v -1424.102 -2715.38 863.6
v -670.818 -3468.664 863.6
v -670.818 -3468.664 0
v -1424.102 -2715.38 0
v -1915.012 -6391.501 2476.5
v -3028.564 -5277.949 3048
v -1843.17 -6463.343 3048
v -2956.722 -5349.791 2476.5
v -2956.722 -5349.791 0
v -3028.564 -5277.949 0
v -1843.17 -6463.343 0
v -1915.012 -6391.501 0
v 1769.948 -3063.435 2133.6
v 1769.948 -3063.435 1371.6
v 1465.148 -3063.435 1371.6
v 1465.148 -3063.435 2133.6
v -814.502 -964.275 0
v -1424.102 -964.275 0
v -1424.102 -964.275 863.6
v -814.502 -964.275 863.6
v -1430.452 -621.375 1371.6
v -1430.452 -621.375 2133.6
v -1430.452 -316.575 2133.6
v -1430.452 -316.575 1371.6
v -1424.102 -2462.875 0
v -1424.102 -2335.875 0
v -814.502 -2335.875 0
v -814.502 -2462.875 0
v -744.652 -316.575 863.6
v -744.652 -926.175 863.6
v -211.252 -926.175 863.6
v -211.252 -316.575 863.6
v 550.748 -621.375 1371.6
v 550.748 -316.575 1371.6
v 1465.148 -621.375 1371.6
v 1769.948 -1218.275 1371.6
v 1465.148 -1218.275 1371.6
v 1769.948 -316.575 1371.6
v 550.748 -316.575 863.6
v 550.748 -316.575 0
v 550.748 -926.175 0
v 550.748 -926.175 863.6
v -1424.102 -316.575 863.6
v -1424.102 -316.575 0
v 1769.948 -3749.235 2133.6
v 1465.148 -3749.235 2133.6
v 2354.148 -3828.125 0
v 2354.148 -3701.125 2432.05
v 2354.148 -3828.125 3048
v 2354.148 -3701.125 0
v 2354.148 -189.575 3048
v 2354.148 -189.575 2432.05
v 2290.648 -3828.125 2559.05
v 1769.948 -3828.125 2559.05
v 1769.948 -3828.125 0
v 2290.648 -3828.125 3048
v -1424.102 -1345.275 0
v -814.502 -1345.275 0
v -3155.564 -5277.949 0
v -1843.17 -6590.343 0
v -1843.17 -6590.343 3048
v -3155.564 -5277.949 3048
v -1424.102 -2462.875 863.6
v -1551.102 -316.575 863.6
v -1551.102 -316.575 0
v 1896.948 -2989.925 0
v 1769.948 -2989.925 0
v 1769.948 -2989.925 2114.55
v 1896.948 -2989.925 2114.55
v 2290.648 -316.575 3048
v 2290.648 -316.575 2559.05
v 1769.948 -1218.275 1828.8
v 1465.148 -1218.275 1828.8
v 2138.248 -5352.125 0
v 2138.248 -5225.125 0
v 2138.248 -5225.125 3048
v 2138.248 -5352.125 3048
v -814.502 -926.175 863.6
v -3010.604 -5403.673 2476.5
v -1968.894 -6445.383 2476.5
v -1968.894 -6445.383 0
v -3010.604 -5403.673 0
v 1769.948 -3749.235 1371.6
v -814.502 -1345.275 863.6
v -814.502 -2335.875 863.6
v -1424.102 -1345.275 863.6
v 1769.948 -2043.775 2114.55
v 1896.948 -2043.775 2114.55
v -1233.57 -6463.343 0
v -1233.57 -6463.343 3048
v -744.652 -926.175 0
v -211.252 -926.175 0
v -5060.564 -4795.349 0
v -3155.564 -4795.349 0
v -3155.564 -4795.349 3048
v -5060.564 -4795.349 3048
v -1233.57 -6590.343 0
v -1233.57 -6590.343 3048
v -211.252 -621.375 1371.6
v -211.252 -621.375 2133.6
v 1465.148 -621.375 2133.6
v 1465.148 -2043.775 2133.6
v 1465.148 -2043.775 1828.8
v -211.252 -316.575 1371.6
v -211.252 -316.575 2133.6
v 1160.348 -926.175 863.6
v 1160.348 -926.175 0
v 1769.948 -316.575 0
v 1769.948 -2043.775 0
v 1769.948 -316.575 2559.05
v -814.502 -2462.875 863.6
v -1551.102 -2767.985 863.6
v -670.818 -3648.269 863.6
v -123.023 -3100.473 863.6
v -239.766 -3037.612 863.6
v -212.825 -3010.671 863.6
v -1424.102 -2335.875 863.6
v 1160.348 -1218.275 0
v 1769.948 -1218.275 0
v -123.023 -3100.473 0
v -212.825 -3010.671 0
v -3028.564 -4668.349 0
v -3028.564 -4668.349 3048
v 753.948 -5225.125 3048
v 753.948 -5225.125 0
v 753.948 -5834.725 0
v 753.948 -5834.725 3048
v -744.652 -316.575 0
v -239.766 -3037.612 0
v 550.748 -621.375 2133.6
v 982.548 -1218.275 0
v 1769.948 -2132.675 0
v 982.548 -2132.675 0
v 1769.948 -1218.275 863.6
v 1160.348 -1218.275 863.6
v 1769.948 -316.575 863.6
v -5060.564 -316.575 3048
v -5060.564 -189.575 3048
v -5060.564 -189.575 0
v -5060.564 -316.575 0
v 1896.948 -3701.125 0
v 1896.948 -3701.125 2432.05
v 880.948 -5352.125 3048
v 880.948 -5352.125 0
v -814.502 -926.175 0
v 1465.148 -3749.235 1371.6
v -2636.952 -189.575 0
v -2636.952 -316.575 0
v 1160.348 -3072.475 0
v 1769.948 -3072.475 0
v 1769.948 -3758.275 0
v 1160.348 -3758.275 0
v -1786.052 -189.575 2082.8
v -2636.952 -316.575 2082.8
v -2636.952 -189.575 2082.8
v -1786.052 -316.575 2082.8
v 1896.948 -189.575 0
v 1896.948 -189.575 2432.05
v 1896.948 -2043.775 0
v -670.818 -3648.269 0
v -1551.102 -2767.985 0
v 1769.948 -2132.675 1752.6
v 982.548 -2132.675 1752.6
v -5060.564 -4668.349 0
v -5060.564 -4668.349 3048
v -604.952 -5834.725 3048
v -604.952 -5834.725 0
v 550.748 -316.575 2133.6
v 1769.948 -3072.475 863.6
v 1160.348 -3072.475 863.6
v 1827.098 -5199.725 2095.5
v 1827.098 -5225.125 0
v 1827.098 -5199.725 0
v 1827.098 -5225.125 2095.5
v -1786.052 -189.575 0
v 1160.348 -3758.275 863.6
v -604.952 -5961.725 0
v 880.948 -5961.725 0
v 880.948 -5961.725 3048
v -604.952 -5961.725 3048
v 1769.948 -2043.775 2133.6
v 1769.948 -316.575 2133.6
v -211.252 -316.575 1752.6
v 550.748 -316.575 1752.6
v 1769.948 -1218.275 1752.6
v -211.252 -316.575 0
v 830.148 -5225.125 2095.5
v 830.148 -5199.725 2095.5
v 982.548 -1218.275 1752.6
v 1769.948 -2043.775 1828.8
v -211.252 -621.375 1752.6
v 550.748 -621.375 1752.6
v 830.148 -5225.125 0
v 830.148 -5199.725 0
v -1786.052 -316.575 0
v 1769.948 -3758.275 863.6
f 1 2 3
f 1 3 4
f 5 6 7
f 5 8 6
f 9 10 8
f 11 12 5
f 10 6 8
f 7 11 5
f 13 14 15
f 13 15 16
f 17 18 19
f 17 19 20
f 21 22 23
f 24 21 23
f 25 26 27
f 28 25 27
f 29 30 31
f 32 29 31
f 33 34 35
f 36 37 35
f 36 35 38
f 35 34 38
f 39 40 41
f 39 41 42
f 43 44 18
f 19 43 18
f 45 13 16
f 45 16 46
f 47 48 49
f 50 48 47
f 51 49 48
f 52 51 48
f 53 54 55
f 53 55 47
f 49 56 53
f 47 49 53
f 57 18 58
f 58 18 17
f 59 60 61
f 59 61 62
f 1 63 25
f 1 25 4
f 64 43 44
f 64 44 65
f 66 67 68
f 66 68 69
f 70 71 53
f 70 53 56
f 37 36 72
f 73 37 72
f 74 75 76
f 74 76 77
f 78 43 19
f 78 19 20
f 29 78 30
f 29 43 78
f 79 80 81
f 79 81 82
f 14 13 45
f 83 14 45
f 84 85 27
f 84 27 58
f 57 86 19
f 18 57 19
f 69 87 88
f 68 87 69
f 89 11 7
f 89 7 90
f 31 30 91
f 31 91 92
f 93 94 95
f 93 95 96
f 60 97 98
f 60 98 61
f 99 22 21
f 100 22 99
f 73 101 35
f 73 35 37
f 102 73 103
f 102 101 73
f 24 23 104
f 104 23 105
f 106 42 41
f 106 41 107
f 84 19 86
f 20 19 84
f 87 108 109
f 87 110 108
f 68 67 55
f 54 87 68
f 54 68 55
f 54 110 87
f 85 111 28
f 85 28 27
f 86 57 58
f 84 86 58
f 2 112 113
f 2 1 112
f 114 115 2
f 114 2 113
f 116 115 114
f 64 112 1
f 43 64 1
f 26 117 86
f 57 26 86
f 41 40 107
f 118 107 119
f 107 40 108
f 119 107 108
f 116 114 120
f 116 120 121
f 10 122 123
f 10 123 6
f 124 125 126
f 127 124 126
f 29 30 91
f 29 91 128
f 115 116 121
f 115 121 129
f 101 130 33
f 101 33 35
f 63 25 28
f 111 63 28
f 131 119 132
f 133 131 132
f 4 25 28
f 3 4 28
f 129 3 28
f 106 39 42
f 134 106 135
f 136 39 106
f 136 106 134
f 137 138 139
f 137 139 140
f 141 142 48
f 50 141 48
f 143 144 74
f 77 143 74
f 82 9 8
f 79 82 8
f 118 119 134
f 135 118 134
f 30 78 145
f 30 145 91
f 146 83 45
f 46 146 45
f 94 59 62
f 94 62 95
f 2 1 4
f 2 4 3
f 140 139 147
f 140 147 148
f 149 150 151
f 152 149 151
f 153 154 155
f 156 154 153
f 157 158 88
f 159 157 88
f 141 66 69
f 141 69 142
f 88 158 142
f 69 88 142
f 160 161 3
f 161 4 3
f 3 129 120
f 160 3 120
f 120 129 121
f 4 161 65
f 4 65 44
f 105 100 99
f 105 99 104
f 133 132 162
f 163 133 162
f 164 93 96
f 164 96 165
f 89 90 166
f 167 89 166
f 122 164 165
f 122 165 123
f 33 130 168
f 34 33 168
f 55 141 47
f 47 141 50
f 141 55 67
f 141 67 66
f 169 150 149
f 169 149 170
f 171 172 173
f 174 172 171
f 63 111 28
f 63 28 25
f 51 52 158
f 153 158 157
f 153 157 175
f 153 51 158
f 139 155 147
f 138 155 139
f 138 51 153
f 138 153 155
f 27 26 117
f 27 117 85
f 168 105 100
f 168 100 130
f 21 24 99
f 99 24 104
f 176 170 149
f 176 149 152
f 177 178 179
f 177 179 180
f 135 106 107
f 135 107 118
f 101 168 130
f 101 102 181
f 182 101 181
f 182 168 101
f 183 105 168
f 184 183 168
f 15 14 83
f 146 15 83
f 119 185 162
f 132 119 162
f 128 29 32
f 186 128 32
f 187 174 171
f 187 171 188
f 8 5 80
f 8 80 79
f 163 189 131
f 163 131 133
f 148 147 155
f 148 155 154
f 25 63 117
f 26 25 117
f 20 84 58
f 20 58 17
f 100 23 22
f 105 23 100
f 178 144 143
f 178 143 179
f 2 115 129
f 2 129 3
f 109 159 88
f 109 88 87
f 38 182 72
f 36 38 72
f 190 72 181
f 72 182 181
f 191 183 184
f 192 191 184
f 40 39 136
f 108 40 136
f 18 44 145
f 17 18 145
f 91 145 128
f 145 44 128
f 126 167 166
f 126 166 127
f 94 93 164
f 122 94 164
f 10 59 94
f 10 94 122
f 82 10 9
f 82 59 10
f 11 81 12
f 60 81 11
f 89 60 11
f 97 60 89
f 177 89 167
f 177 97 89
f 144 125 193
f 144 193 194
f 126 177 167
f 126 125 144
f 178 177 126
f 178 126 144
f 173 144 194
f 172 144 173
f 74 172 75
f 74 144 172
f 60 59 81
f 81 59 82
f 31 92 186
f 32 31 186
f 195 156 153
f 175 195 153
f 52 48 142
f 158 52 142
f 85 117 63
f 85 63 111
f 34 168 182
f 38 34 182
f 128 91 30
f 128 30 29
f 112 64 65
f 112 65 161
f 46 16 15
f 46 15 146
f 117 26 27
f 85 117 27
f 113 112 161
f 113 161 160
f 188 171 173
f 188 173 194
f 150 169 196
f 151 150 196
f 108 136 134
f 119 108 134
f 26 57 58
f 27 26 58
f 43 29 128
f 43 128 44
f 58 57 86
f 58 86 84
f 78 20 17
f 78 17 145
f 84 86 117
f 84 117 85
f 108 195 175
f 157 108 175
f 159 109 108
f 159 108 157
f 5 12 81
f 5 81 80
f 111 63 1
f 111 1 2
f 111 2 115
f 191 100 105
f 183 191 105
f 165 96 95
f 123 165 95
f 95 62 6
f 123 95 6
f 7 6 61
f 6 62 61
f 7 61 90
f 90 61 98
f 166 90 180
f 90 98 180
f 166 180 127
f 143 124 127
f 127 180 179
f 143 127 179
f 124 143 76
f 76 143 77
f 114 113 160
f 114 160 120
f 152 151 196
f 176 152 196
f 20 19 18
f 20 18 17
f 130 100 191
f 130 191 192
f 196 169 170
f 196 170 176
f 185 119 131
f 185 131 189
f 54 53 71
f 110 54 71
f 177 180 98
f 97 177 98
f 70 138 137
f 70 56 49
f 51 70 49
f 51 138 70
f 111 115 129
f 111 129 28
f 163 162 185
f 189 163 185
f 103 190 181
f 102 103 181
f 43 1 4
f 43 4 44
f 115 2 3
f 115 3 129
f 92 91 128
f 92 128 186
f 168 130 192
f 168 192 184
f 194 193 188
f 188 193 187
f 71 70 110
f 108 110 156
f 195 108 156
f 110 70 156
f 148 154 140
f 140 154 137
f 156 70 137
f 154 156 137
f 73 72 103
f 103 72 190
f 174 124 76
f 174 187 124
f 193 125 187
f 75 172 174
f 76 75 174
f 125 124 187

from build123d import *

# Parameters (mm, degrees)
F0_W      = 3556
F0_H      = 127
F1_DEPTH  = 3048
F3_DEPTH  = 3048
F4_W      = 127
F4_H      = 838.2
F5_DEPTH  = 3048
F6_W      = 1016
F6_H      = 127
F7_DEPTH  = 3048
F8_W      = 127
F8_H      = 482.6
F9_DEPTH  = 3048
F10_W     = 368.3
F10_H     = 127
F11_DEPTH = 3048
F12_W     = 996.95
F12_H     = 2095.5
F13_DEPTH = 25.4
F14_W     = 850.9
F14_H     = 965.2
F15_DEPTH = 127
F16_W     = 127
F16_H     = 965.2
F16_H_2   = 2082.8
F17_DEPTH = 2423.611736456
F18_W     = 1059.5979121052
F18_H     = 933.45
F19_DEPTH = 127
F21_W     = 457.2
F21_H     = 127
F22_DEPTH = 3048
F24_W     = 520.7
F24_H     = 3638.55
F25_DEPTH = 127
F26_W     = 3699.2286321938
F26_H     = 1626.0209083557
F27_DEPTH = 1270
F29_DEPTH = 127
F30_W     = 63.5
F30_H     = 615.95
F31_DEPTH = 3511.55
F32_W     = 685.8
F32_H     = 863.6
F33_DEPTH = 609.6
F34_W     = 685.8
F34_H     = 762
F35_DEPTH = 304.8
F36_W     = 901.7
F36_H     = 863.6
F37_DEPTH = 609.6
F38_W     = 825.5
F38_H     = 1752.6
F38_W_2   = 88.9
F39_DEPTH = 787.4
F40_W     = 609.6
F40_H     = 863.6
F41_DEPTH = 609.6
F45_DEPTH = 304.8
F46_W     = 1473.2
F46_H     = 2476.5
F47_DEPTH = 76.2
F48_W     = 914.4
F48_H     = 304.8
F49_DEPTH = 762
F50_W     = 762
F50_H     = 304.8
F51_DEPTH = 381
F52_W     = 1219.2
F52_H     = 304.8
F53_DEPTH = 762
F54_W     = 533.4
F54_H     = 609.6
F55_DEPTH = 863.6
F57_DEPTH = 863.6
F58_W     = 609.6
F58_H     = 381
F59_DEPTH = 863.6
F60_W     = 609.6
F60_H     = 990.6
F61_DEPTH = 863.6
F62_W     = 609.6
F62_H     = 127
F63_DEPTH = 863.6
F65_DEPTH = 863.6
F67_DEPTH = 863.6


with BuildPart() as f1:
    # F0 (on Top) → F1 (new body)
    with BuildSketch(Plane.XY):
        with Locations((-8.052283898, -253.0751817405)):
            Rectangle(F0_W, F0_H)
    extrude(amount=F1_DEPTH)

    # F2 (on face) → F3 (join, through all)
    with BuildSketch(Plane(origin=(0, 0, 0), x_dir=(1, 0, 0), z_dir=(0, 0, -1))):
        Polygon((1769.947716102, 2043.7751817405), (1769.947716102, 316.5751817405), (1769.947716102, 189.5751817405), (1896.947716102, 189.5751817405), (1896.947716102, 2043.7751817405), align=None)
    extrude(amount=-F3_DEPTH)

    # F14 (on face) → F15 (join, through all)
    with BuildSketch(Plane.XZ.offset(316.5751817405)):
        with Locations((-2211.502283898, 2565.4)):
            Rectangle(F14_W, F14_H)
    extrude(amount=-F15_DEPTH)

    # F16 (on face) → F17 (join, through all)
    with BuildSketch(Plane(origin=(-2636.952283898, 0, 0), x_dir=(0, -1, 0), z_dir=(-1, 0, 0))):
        with Locations((253.0751817405, 2565.4)):
            Rectangle(F16_W, F16_H)
        with Locations((253.0751817405, 1041.4)):
            Rectangle(F16_W, F16_H_2)
    extrude(amount=F17_DEPTH)



with BuildPart() as f5:
    # F4 (on face) → F5 (new body, through all)
    with BuildSketch(Plane(origin=(0, 0, 0), x_dir=(1, 0, 0), z_dir=(0, 0, -1))):
        with Locations((1833.447716102, 3409.0251817405)):
            Rectangle(F4_W, F4_H)
    extrude(amount=-F5_DEPTH)


with BuildPart() as f7:
    # F6 (on face) → F7 (new body, through all)
    with BuildSketch(Plane(origin=(0, 0, 0), x_dir=(1, 0, 0), z_dir=(0, 0, -1))):
        with Locations((1261.947716102, 5288.6251817405)):
            Rectangle(F6_W, F6_H)
    extrude(amount=-F7_DEPTH)

    # F8 (on face) → F9 (join, through all)
    with BuildSketch(Plane(origin=(0, 0, 0), x_dir=(1, 0, 0), z_dir=(0, 0, -1))):
        Polygon((-3028.564020354, 5277.9493022342), (-1843.1702123728, 6463.3431102153), (-1843.1702123728, 6590.3431102153), (-3155.564020354, 5277.9493022342), (-3155.564020354, 4795.3493022342), (-5060.564020354, 4795.3493022342), (-5060.564020354, 4668.3493022342), (-3028.564020354, 4668.3493022342), align=None)
        Polygon((-1233.5702123728, 6463.3431102153), (-604.952283898, 5834.7251817405), (-604.952283898, 5961.7251817405), (-1233.5702123728, 6590.3431102153), (-1843.1702123728, 6590.3431102153), (-1843.1702123728, 6463.3431102153), align=None)
        Polygon((-604.952283898, 5834.7251817405), (753.947716102, 5834.7251817405), (880.947716102, 5834.7251817405), (880.947716102, 5961.7251817405), (-604.952283898, 5961.7251817405), align=None)
        with Locations((817.447716102, 5593.4251817405)):
            Rectangle(F8_W, F8_H)
    extrude(amount=-F9_DEPTH)

    # F10 (on face) → F11 (join, through all)
    with BuildSketch(Plane(origin=(0, 0, 0), x_dir=(1, 0, 0), z_dir=(0, 0, -1))):
        with Locations((1954.097716102, 5288.6251817405)):
            Rectangle(F10_W, F10_H)
    extrude(amount=-F11_DEPTH)

    # F12 (on face) → F13 (join)
    with BuildSketch(Plane(origin=(0, -5225.1251817405, 0), x_dir=(-1, 0, 0), z_dir=(0, 1, 0))):
        with Locations((-1328.622716102, 1047.75)):
            Rectangle(F12_W, F12_H)
    extrude(amount=F13_DEPTH)

    # F46 (on face) → F47 (cut)
    with BuildSketch(Plane(origin=(-4153.2566612941, -4153.2566612941, 0), x_dir=(-0.7071067812, 0.7071067812, 0), z_dir=(0.7071067812, 0.7071067812, 0))):
        with Locations((-2428.7555863187, 1238.25)):
            Rectangle(F46_W, F46_H)
    extrude(amount=-F47_DEPTH, mode=Mode.SUBTRACT)


with BuildPart() as f1_1:
    add(f1.part)

    add(f5.part)  # F19 merges F5
    # F18 (on face) → F19 (join, through all)
    with BuildSketch(Plane(origin=(1769.947716102, 0, 0), x_dir=(0, -1, 0), z_dir=(-1, 0, 0))):
        with Locations((2573.5741377931, 2581.275)):
            Rectangle(F18_W, F18_H)
    extrude(amount=-F19_DEPTH)

    # F20: union 

    # F21 (on face) → F22 (join, through all)
    with BuildSketch(Plane.XY.offset(3048)):
        with Locations((2125.547716102, -3764.6251817405)):
            Rectangle(F21_W, F21_H)
    extrude(amount=-F22_DEPTH)

    # F24 (on offset) → F25 (join)
    with BuildSketch(Plane(origin=(0, 0, 2559.05), x_dir=(1, 0, 0), z_dir=(0, 0, -1))):
        with Locations((2030.297716102, 2008.8501817405)):
            Rectangle(F24_W, F24_H)
    extrude(amount=F25_DEPTH)

    # F26 (on face) → F27 (cut)
    with BuildSketch(Plane.YZ.offset(2290.647716102)):
        with Locations((-2166.1894978374, 3372.0604541779)):
            Rectangle(F26_W, F26_H)
    extrude(amount=-F27_DEPTH, mode=Mode.SUBTRACT)

    # F28 (on face) → F29 (join, through all)
    with BuildSketch(Plane(origin=(0, -189.5751817405, 0), x_dir=(-1, 0, 0), z_dir=(0, 1, 0))):
        Polygon((-1896.947716102, 2559.05), (-1896.947716102, 3048), (-2354.147716102, 3048), (-2354.147716102, 2432.05), (-2290.647716102, 2432.05), (-2290.647716102, 2559.05), align=None)
    extrude(amount=-F29_DEPTH)

    # F30 (on face) → F31 (join, through all)
    with BuildSketch(Plane(origin=(0, -189.5751817405, 0), x_dir=(-1, 0, 0), z_dir=(0, 1, 0))):
        with Locations((-2322.397716102, 2740.025)):
            Rectangle(F30_W, F30_H)
    extrude(amount=-F31_DEPTH)


with BuildPart() as f33:
    # F32 (on face) → F33 (new body)
    with BuildSketch(Plane(origin=(1769.947716102, 0, 0), x_dir=(0, -1, 0), z_dir=(-1, 0, 0))):
        with Locations((3415.3751817405, 431.8)):
            Rectangle(F32_W, F32_H)
    extrude(amount=F33_DEPTH)


with BuildPart() as f35:
    # F34 (on face) → F35 (new body)
    with BuildSketch(Plane(origin=(1769.947716102, 0, 0), x_dir=(0, -1, 0), z_dir=(-1, 0, 0))):
        with Locations((3406.3354730606, 1752.6)):
            Rectangle(F34_W, F34_H)
    extrude(amount=F35_DEPTH)


with BuildPart() as f37:
    # F36 (on face) → F37 (new body)
    with BuildSketch(Plane(origin=(1769.947716102, 0, 0), x_dir=(0, -1, 0), z_dir=(-1, 0, 0))):
        with Locations((767.4251817405, 431.8)):
            Rectangle(F36_W, F36_H)
    extrude(amount=F37_DEPTH)

    # F40 (on face) → F41 (join)
    with BuildSketch(Plane.XZ.offset(316.5751817405)):
        with Locations((855.547716102, 431.8)):
            Rectangle(F40_W, F40_H)
    extrude(amount=F41_DEPTH)


with BuildPart() as f39:
    # F38 (on face) → F39 (new body)
    with BuildSketch(Plane(origin=(1769.947716102, 0, 0), x_dir=(0, -1, 0), z_dir=(-1, 0, 0))):
        with Locations((1631.0251817405, 876.3)):
            Rectangle(F38_W, F38_H)
        with Locations((2088.2251817405, 876.3)):
            Rectangle(F38_W_2, F38_H)
    extrude(amount=F39_DEPTH)


with BuildPart() as f45:
    # F44 (on face) → F45 (new body, through all)
    with BuildSketch(Plane(origin=(1769.947716102, 0, 0), x_dir=(0, -1, 0), z_dir=(-1, 0, 0))):
        Polygon((2043.7751817405, 2114.55), (2043.7751817405, 2133.6), (316.5751817405, 2133.6), (316.5751817405, 1371.6), (1218.2751817405, 1371.6), (1218.2751817405, 1828.8), (2043.7751817405, 1828.8), align=None)
    extrude(amount=F45_DEPTH)

    # F48 (on face) → F49 (join, through all)
    with BuildSketch(Plane.XY.offset(2133.6)):
        with Locations((1007.947716102, -468.9751817405)):
            Rectangle(F48_W, F48_H)
    extrude(amount=-F49_DEPTH)


with BuildPart() as f51:
    # F50 (on face) → F51 (new body)
    with BuildSketch(Plane.XY.offset(2133.6)):
        with Locations((169.747716102, -468.9751817405)):
            Rectangle(F50_W, F50_H)
    extrude(amount=-F51_DEPTH)


with BuildPart() as f53:
    # F52 (on face) → F53 (new body, through all)
    with BuildSketch(Plane.XY.offset(2133.6)):
        with Locations((-820.852283898, -468.9751817405)):
            Rectangle(F52_W, F52_H)
    extrude(amount=-F53_DEPTH)


with BuildPart() as f55:
    # F54 (on face) → F55 (new body, through all)
    with BuildSketch(Plane.XY.offset(863.6)):
        with Locations((-477.952283898, -621.3751817405)):
            Rectangle(F54_W, F54_H)
    extrude(amount=-F55_DEPTH)


with BuildPart() as f57:
    # F56 (on face) → F57 (new body, through all)
    with BuildSketch(Plane.XY.offset(863.6)):
        Polygon((-814.502283898, -926.1751817405), (-744.652283898, -926.1751817405), (-744.652283898, -316.5751817405), (-1424.102283898, -316.5751817405), (-1424.102283898, -964.2751817405), (-814.502283898, -964.2751817405), align=None)
    extrude(amount=-F57_DEPTH)


with BuildPart() as f59:
    # F58 (on face) → F59 (new body, through all)
    with BuildSketch(Plane.XY.offset(863.6)):
        with Locations((-1119.302283898, -1154.7751817405)):
            Rectangle(F58_W, F58_H)
    extrude(amount=-F59_DEPTH)


with BuildPart() as f61:
    # F60 (on face) → F61 (new body, through all)
    with BuildSketch(Plane.XY.offset(863.6)):
        with Locations((-1119.302283898, -1840.5751817405)):
            Rectangle(F60_W, F60_H)
    extrude(amount=-F61_DEPTH)


with BuildPart() as f63:
    # F62 (on face) → F63 (new body, through all)
    with BuildSketch(Plane.XY.offset(863.6)):
        with Locations((-1119.302283898, -2399.3751817405)):
            Rectangle(F62_W, F62_H)
    extrude(amount=-F63_DEPTH)


with BuildPart() as f65:
    # F64 (on face) → F65 (new body, through all)
    with BuildSketch(Plane.XY.offset(863.6)):
        Polygon((-239.7658921496, -3037.6115734889), (-814.502283898, -2462.8751817405), (-1424.102283898, -2462.8751817405), (-1424.102283898, -2715.3797693631), (-670.8181859609, -3468.6638673002), align=None)
    extrude(amount=-F65_DEPTH)


with BuildPart() as f67:
    # F66 (on face) → F67 (new body, through all)
    with BuildSketch(Plane.XY.offset(863.6)):
        Polygon((-212.8251237863, -3010.6708051257), (-239.7658921496, -3037.6115734889), (-670.8181859609, -3468.6638673002), (-1424.102283898, -2715.3797693631), (-1424.102283898, -2462.8751817405), (-1424.102283898, -316.5751817405), (-1551.102283898, -316.5751817405), (-1551.102283898, -2767.9848917845), (-670.8181859609, -3648.2689897216), (-123.0225625757, -3100.4733663364), align=None)
    extrude(amount=-F67_DEPTH)


solid = Compound([f7.part, f1_1.part, f33.part, f35.part, f37.part, f39.part, f45.part, f51.part, f53.part, f55.part, f57.part, f59.part, f61.part, f63.part, f65.part, f67.part])
